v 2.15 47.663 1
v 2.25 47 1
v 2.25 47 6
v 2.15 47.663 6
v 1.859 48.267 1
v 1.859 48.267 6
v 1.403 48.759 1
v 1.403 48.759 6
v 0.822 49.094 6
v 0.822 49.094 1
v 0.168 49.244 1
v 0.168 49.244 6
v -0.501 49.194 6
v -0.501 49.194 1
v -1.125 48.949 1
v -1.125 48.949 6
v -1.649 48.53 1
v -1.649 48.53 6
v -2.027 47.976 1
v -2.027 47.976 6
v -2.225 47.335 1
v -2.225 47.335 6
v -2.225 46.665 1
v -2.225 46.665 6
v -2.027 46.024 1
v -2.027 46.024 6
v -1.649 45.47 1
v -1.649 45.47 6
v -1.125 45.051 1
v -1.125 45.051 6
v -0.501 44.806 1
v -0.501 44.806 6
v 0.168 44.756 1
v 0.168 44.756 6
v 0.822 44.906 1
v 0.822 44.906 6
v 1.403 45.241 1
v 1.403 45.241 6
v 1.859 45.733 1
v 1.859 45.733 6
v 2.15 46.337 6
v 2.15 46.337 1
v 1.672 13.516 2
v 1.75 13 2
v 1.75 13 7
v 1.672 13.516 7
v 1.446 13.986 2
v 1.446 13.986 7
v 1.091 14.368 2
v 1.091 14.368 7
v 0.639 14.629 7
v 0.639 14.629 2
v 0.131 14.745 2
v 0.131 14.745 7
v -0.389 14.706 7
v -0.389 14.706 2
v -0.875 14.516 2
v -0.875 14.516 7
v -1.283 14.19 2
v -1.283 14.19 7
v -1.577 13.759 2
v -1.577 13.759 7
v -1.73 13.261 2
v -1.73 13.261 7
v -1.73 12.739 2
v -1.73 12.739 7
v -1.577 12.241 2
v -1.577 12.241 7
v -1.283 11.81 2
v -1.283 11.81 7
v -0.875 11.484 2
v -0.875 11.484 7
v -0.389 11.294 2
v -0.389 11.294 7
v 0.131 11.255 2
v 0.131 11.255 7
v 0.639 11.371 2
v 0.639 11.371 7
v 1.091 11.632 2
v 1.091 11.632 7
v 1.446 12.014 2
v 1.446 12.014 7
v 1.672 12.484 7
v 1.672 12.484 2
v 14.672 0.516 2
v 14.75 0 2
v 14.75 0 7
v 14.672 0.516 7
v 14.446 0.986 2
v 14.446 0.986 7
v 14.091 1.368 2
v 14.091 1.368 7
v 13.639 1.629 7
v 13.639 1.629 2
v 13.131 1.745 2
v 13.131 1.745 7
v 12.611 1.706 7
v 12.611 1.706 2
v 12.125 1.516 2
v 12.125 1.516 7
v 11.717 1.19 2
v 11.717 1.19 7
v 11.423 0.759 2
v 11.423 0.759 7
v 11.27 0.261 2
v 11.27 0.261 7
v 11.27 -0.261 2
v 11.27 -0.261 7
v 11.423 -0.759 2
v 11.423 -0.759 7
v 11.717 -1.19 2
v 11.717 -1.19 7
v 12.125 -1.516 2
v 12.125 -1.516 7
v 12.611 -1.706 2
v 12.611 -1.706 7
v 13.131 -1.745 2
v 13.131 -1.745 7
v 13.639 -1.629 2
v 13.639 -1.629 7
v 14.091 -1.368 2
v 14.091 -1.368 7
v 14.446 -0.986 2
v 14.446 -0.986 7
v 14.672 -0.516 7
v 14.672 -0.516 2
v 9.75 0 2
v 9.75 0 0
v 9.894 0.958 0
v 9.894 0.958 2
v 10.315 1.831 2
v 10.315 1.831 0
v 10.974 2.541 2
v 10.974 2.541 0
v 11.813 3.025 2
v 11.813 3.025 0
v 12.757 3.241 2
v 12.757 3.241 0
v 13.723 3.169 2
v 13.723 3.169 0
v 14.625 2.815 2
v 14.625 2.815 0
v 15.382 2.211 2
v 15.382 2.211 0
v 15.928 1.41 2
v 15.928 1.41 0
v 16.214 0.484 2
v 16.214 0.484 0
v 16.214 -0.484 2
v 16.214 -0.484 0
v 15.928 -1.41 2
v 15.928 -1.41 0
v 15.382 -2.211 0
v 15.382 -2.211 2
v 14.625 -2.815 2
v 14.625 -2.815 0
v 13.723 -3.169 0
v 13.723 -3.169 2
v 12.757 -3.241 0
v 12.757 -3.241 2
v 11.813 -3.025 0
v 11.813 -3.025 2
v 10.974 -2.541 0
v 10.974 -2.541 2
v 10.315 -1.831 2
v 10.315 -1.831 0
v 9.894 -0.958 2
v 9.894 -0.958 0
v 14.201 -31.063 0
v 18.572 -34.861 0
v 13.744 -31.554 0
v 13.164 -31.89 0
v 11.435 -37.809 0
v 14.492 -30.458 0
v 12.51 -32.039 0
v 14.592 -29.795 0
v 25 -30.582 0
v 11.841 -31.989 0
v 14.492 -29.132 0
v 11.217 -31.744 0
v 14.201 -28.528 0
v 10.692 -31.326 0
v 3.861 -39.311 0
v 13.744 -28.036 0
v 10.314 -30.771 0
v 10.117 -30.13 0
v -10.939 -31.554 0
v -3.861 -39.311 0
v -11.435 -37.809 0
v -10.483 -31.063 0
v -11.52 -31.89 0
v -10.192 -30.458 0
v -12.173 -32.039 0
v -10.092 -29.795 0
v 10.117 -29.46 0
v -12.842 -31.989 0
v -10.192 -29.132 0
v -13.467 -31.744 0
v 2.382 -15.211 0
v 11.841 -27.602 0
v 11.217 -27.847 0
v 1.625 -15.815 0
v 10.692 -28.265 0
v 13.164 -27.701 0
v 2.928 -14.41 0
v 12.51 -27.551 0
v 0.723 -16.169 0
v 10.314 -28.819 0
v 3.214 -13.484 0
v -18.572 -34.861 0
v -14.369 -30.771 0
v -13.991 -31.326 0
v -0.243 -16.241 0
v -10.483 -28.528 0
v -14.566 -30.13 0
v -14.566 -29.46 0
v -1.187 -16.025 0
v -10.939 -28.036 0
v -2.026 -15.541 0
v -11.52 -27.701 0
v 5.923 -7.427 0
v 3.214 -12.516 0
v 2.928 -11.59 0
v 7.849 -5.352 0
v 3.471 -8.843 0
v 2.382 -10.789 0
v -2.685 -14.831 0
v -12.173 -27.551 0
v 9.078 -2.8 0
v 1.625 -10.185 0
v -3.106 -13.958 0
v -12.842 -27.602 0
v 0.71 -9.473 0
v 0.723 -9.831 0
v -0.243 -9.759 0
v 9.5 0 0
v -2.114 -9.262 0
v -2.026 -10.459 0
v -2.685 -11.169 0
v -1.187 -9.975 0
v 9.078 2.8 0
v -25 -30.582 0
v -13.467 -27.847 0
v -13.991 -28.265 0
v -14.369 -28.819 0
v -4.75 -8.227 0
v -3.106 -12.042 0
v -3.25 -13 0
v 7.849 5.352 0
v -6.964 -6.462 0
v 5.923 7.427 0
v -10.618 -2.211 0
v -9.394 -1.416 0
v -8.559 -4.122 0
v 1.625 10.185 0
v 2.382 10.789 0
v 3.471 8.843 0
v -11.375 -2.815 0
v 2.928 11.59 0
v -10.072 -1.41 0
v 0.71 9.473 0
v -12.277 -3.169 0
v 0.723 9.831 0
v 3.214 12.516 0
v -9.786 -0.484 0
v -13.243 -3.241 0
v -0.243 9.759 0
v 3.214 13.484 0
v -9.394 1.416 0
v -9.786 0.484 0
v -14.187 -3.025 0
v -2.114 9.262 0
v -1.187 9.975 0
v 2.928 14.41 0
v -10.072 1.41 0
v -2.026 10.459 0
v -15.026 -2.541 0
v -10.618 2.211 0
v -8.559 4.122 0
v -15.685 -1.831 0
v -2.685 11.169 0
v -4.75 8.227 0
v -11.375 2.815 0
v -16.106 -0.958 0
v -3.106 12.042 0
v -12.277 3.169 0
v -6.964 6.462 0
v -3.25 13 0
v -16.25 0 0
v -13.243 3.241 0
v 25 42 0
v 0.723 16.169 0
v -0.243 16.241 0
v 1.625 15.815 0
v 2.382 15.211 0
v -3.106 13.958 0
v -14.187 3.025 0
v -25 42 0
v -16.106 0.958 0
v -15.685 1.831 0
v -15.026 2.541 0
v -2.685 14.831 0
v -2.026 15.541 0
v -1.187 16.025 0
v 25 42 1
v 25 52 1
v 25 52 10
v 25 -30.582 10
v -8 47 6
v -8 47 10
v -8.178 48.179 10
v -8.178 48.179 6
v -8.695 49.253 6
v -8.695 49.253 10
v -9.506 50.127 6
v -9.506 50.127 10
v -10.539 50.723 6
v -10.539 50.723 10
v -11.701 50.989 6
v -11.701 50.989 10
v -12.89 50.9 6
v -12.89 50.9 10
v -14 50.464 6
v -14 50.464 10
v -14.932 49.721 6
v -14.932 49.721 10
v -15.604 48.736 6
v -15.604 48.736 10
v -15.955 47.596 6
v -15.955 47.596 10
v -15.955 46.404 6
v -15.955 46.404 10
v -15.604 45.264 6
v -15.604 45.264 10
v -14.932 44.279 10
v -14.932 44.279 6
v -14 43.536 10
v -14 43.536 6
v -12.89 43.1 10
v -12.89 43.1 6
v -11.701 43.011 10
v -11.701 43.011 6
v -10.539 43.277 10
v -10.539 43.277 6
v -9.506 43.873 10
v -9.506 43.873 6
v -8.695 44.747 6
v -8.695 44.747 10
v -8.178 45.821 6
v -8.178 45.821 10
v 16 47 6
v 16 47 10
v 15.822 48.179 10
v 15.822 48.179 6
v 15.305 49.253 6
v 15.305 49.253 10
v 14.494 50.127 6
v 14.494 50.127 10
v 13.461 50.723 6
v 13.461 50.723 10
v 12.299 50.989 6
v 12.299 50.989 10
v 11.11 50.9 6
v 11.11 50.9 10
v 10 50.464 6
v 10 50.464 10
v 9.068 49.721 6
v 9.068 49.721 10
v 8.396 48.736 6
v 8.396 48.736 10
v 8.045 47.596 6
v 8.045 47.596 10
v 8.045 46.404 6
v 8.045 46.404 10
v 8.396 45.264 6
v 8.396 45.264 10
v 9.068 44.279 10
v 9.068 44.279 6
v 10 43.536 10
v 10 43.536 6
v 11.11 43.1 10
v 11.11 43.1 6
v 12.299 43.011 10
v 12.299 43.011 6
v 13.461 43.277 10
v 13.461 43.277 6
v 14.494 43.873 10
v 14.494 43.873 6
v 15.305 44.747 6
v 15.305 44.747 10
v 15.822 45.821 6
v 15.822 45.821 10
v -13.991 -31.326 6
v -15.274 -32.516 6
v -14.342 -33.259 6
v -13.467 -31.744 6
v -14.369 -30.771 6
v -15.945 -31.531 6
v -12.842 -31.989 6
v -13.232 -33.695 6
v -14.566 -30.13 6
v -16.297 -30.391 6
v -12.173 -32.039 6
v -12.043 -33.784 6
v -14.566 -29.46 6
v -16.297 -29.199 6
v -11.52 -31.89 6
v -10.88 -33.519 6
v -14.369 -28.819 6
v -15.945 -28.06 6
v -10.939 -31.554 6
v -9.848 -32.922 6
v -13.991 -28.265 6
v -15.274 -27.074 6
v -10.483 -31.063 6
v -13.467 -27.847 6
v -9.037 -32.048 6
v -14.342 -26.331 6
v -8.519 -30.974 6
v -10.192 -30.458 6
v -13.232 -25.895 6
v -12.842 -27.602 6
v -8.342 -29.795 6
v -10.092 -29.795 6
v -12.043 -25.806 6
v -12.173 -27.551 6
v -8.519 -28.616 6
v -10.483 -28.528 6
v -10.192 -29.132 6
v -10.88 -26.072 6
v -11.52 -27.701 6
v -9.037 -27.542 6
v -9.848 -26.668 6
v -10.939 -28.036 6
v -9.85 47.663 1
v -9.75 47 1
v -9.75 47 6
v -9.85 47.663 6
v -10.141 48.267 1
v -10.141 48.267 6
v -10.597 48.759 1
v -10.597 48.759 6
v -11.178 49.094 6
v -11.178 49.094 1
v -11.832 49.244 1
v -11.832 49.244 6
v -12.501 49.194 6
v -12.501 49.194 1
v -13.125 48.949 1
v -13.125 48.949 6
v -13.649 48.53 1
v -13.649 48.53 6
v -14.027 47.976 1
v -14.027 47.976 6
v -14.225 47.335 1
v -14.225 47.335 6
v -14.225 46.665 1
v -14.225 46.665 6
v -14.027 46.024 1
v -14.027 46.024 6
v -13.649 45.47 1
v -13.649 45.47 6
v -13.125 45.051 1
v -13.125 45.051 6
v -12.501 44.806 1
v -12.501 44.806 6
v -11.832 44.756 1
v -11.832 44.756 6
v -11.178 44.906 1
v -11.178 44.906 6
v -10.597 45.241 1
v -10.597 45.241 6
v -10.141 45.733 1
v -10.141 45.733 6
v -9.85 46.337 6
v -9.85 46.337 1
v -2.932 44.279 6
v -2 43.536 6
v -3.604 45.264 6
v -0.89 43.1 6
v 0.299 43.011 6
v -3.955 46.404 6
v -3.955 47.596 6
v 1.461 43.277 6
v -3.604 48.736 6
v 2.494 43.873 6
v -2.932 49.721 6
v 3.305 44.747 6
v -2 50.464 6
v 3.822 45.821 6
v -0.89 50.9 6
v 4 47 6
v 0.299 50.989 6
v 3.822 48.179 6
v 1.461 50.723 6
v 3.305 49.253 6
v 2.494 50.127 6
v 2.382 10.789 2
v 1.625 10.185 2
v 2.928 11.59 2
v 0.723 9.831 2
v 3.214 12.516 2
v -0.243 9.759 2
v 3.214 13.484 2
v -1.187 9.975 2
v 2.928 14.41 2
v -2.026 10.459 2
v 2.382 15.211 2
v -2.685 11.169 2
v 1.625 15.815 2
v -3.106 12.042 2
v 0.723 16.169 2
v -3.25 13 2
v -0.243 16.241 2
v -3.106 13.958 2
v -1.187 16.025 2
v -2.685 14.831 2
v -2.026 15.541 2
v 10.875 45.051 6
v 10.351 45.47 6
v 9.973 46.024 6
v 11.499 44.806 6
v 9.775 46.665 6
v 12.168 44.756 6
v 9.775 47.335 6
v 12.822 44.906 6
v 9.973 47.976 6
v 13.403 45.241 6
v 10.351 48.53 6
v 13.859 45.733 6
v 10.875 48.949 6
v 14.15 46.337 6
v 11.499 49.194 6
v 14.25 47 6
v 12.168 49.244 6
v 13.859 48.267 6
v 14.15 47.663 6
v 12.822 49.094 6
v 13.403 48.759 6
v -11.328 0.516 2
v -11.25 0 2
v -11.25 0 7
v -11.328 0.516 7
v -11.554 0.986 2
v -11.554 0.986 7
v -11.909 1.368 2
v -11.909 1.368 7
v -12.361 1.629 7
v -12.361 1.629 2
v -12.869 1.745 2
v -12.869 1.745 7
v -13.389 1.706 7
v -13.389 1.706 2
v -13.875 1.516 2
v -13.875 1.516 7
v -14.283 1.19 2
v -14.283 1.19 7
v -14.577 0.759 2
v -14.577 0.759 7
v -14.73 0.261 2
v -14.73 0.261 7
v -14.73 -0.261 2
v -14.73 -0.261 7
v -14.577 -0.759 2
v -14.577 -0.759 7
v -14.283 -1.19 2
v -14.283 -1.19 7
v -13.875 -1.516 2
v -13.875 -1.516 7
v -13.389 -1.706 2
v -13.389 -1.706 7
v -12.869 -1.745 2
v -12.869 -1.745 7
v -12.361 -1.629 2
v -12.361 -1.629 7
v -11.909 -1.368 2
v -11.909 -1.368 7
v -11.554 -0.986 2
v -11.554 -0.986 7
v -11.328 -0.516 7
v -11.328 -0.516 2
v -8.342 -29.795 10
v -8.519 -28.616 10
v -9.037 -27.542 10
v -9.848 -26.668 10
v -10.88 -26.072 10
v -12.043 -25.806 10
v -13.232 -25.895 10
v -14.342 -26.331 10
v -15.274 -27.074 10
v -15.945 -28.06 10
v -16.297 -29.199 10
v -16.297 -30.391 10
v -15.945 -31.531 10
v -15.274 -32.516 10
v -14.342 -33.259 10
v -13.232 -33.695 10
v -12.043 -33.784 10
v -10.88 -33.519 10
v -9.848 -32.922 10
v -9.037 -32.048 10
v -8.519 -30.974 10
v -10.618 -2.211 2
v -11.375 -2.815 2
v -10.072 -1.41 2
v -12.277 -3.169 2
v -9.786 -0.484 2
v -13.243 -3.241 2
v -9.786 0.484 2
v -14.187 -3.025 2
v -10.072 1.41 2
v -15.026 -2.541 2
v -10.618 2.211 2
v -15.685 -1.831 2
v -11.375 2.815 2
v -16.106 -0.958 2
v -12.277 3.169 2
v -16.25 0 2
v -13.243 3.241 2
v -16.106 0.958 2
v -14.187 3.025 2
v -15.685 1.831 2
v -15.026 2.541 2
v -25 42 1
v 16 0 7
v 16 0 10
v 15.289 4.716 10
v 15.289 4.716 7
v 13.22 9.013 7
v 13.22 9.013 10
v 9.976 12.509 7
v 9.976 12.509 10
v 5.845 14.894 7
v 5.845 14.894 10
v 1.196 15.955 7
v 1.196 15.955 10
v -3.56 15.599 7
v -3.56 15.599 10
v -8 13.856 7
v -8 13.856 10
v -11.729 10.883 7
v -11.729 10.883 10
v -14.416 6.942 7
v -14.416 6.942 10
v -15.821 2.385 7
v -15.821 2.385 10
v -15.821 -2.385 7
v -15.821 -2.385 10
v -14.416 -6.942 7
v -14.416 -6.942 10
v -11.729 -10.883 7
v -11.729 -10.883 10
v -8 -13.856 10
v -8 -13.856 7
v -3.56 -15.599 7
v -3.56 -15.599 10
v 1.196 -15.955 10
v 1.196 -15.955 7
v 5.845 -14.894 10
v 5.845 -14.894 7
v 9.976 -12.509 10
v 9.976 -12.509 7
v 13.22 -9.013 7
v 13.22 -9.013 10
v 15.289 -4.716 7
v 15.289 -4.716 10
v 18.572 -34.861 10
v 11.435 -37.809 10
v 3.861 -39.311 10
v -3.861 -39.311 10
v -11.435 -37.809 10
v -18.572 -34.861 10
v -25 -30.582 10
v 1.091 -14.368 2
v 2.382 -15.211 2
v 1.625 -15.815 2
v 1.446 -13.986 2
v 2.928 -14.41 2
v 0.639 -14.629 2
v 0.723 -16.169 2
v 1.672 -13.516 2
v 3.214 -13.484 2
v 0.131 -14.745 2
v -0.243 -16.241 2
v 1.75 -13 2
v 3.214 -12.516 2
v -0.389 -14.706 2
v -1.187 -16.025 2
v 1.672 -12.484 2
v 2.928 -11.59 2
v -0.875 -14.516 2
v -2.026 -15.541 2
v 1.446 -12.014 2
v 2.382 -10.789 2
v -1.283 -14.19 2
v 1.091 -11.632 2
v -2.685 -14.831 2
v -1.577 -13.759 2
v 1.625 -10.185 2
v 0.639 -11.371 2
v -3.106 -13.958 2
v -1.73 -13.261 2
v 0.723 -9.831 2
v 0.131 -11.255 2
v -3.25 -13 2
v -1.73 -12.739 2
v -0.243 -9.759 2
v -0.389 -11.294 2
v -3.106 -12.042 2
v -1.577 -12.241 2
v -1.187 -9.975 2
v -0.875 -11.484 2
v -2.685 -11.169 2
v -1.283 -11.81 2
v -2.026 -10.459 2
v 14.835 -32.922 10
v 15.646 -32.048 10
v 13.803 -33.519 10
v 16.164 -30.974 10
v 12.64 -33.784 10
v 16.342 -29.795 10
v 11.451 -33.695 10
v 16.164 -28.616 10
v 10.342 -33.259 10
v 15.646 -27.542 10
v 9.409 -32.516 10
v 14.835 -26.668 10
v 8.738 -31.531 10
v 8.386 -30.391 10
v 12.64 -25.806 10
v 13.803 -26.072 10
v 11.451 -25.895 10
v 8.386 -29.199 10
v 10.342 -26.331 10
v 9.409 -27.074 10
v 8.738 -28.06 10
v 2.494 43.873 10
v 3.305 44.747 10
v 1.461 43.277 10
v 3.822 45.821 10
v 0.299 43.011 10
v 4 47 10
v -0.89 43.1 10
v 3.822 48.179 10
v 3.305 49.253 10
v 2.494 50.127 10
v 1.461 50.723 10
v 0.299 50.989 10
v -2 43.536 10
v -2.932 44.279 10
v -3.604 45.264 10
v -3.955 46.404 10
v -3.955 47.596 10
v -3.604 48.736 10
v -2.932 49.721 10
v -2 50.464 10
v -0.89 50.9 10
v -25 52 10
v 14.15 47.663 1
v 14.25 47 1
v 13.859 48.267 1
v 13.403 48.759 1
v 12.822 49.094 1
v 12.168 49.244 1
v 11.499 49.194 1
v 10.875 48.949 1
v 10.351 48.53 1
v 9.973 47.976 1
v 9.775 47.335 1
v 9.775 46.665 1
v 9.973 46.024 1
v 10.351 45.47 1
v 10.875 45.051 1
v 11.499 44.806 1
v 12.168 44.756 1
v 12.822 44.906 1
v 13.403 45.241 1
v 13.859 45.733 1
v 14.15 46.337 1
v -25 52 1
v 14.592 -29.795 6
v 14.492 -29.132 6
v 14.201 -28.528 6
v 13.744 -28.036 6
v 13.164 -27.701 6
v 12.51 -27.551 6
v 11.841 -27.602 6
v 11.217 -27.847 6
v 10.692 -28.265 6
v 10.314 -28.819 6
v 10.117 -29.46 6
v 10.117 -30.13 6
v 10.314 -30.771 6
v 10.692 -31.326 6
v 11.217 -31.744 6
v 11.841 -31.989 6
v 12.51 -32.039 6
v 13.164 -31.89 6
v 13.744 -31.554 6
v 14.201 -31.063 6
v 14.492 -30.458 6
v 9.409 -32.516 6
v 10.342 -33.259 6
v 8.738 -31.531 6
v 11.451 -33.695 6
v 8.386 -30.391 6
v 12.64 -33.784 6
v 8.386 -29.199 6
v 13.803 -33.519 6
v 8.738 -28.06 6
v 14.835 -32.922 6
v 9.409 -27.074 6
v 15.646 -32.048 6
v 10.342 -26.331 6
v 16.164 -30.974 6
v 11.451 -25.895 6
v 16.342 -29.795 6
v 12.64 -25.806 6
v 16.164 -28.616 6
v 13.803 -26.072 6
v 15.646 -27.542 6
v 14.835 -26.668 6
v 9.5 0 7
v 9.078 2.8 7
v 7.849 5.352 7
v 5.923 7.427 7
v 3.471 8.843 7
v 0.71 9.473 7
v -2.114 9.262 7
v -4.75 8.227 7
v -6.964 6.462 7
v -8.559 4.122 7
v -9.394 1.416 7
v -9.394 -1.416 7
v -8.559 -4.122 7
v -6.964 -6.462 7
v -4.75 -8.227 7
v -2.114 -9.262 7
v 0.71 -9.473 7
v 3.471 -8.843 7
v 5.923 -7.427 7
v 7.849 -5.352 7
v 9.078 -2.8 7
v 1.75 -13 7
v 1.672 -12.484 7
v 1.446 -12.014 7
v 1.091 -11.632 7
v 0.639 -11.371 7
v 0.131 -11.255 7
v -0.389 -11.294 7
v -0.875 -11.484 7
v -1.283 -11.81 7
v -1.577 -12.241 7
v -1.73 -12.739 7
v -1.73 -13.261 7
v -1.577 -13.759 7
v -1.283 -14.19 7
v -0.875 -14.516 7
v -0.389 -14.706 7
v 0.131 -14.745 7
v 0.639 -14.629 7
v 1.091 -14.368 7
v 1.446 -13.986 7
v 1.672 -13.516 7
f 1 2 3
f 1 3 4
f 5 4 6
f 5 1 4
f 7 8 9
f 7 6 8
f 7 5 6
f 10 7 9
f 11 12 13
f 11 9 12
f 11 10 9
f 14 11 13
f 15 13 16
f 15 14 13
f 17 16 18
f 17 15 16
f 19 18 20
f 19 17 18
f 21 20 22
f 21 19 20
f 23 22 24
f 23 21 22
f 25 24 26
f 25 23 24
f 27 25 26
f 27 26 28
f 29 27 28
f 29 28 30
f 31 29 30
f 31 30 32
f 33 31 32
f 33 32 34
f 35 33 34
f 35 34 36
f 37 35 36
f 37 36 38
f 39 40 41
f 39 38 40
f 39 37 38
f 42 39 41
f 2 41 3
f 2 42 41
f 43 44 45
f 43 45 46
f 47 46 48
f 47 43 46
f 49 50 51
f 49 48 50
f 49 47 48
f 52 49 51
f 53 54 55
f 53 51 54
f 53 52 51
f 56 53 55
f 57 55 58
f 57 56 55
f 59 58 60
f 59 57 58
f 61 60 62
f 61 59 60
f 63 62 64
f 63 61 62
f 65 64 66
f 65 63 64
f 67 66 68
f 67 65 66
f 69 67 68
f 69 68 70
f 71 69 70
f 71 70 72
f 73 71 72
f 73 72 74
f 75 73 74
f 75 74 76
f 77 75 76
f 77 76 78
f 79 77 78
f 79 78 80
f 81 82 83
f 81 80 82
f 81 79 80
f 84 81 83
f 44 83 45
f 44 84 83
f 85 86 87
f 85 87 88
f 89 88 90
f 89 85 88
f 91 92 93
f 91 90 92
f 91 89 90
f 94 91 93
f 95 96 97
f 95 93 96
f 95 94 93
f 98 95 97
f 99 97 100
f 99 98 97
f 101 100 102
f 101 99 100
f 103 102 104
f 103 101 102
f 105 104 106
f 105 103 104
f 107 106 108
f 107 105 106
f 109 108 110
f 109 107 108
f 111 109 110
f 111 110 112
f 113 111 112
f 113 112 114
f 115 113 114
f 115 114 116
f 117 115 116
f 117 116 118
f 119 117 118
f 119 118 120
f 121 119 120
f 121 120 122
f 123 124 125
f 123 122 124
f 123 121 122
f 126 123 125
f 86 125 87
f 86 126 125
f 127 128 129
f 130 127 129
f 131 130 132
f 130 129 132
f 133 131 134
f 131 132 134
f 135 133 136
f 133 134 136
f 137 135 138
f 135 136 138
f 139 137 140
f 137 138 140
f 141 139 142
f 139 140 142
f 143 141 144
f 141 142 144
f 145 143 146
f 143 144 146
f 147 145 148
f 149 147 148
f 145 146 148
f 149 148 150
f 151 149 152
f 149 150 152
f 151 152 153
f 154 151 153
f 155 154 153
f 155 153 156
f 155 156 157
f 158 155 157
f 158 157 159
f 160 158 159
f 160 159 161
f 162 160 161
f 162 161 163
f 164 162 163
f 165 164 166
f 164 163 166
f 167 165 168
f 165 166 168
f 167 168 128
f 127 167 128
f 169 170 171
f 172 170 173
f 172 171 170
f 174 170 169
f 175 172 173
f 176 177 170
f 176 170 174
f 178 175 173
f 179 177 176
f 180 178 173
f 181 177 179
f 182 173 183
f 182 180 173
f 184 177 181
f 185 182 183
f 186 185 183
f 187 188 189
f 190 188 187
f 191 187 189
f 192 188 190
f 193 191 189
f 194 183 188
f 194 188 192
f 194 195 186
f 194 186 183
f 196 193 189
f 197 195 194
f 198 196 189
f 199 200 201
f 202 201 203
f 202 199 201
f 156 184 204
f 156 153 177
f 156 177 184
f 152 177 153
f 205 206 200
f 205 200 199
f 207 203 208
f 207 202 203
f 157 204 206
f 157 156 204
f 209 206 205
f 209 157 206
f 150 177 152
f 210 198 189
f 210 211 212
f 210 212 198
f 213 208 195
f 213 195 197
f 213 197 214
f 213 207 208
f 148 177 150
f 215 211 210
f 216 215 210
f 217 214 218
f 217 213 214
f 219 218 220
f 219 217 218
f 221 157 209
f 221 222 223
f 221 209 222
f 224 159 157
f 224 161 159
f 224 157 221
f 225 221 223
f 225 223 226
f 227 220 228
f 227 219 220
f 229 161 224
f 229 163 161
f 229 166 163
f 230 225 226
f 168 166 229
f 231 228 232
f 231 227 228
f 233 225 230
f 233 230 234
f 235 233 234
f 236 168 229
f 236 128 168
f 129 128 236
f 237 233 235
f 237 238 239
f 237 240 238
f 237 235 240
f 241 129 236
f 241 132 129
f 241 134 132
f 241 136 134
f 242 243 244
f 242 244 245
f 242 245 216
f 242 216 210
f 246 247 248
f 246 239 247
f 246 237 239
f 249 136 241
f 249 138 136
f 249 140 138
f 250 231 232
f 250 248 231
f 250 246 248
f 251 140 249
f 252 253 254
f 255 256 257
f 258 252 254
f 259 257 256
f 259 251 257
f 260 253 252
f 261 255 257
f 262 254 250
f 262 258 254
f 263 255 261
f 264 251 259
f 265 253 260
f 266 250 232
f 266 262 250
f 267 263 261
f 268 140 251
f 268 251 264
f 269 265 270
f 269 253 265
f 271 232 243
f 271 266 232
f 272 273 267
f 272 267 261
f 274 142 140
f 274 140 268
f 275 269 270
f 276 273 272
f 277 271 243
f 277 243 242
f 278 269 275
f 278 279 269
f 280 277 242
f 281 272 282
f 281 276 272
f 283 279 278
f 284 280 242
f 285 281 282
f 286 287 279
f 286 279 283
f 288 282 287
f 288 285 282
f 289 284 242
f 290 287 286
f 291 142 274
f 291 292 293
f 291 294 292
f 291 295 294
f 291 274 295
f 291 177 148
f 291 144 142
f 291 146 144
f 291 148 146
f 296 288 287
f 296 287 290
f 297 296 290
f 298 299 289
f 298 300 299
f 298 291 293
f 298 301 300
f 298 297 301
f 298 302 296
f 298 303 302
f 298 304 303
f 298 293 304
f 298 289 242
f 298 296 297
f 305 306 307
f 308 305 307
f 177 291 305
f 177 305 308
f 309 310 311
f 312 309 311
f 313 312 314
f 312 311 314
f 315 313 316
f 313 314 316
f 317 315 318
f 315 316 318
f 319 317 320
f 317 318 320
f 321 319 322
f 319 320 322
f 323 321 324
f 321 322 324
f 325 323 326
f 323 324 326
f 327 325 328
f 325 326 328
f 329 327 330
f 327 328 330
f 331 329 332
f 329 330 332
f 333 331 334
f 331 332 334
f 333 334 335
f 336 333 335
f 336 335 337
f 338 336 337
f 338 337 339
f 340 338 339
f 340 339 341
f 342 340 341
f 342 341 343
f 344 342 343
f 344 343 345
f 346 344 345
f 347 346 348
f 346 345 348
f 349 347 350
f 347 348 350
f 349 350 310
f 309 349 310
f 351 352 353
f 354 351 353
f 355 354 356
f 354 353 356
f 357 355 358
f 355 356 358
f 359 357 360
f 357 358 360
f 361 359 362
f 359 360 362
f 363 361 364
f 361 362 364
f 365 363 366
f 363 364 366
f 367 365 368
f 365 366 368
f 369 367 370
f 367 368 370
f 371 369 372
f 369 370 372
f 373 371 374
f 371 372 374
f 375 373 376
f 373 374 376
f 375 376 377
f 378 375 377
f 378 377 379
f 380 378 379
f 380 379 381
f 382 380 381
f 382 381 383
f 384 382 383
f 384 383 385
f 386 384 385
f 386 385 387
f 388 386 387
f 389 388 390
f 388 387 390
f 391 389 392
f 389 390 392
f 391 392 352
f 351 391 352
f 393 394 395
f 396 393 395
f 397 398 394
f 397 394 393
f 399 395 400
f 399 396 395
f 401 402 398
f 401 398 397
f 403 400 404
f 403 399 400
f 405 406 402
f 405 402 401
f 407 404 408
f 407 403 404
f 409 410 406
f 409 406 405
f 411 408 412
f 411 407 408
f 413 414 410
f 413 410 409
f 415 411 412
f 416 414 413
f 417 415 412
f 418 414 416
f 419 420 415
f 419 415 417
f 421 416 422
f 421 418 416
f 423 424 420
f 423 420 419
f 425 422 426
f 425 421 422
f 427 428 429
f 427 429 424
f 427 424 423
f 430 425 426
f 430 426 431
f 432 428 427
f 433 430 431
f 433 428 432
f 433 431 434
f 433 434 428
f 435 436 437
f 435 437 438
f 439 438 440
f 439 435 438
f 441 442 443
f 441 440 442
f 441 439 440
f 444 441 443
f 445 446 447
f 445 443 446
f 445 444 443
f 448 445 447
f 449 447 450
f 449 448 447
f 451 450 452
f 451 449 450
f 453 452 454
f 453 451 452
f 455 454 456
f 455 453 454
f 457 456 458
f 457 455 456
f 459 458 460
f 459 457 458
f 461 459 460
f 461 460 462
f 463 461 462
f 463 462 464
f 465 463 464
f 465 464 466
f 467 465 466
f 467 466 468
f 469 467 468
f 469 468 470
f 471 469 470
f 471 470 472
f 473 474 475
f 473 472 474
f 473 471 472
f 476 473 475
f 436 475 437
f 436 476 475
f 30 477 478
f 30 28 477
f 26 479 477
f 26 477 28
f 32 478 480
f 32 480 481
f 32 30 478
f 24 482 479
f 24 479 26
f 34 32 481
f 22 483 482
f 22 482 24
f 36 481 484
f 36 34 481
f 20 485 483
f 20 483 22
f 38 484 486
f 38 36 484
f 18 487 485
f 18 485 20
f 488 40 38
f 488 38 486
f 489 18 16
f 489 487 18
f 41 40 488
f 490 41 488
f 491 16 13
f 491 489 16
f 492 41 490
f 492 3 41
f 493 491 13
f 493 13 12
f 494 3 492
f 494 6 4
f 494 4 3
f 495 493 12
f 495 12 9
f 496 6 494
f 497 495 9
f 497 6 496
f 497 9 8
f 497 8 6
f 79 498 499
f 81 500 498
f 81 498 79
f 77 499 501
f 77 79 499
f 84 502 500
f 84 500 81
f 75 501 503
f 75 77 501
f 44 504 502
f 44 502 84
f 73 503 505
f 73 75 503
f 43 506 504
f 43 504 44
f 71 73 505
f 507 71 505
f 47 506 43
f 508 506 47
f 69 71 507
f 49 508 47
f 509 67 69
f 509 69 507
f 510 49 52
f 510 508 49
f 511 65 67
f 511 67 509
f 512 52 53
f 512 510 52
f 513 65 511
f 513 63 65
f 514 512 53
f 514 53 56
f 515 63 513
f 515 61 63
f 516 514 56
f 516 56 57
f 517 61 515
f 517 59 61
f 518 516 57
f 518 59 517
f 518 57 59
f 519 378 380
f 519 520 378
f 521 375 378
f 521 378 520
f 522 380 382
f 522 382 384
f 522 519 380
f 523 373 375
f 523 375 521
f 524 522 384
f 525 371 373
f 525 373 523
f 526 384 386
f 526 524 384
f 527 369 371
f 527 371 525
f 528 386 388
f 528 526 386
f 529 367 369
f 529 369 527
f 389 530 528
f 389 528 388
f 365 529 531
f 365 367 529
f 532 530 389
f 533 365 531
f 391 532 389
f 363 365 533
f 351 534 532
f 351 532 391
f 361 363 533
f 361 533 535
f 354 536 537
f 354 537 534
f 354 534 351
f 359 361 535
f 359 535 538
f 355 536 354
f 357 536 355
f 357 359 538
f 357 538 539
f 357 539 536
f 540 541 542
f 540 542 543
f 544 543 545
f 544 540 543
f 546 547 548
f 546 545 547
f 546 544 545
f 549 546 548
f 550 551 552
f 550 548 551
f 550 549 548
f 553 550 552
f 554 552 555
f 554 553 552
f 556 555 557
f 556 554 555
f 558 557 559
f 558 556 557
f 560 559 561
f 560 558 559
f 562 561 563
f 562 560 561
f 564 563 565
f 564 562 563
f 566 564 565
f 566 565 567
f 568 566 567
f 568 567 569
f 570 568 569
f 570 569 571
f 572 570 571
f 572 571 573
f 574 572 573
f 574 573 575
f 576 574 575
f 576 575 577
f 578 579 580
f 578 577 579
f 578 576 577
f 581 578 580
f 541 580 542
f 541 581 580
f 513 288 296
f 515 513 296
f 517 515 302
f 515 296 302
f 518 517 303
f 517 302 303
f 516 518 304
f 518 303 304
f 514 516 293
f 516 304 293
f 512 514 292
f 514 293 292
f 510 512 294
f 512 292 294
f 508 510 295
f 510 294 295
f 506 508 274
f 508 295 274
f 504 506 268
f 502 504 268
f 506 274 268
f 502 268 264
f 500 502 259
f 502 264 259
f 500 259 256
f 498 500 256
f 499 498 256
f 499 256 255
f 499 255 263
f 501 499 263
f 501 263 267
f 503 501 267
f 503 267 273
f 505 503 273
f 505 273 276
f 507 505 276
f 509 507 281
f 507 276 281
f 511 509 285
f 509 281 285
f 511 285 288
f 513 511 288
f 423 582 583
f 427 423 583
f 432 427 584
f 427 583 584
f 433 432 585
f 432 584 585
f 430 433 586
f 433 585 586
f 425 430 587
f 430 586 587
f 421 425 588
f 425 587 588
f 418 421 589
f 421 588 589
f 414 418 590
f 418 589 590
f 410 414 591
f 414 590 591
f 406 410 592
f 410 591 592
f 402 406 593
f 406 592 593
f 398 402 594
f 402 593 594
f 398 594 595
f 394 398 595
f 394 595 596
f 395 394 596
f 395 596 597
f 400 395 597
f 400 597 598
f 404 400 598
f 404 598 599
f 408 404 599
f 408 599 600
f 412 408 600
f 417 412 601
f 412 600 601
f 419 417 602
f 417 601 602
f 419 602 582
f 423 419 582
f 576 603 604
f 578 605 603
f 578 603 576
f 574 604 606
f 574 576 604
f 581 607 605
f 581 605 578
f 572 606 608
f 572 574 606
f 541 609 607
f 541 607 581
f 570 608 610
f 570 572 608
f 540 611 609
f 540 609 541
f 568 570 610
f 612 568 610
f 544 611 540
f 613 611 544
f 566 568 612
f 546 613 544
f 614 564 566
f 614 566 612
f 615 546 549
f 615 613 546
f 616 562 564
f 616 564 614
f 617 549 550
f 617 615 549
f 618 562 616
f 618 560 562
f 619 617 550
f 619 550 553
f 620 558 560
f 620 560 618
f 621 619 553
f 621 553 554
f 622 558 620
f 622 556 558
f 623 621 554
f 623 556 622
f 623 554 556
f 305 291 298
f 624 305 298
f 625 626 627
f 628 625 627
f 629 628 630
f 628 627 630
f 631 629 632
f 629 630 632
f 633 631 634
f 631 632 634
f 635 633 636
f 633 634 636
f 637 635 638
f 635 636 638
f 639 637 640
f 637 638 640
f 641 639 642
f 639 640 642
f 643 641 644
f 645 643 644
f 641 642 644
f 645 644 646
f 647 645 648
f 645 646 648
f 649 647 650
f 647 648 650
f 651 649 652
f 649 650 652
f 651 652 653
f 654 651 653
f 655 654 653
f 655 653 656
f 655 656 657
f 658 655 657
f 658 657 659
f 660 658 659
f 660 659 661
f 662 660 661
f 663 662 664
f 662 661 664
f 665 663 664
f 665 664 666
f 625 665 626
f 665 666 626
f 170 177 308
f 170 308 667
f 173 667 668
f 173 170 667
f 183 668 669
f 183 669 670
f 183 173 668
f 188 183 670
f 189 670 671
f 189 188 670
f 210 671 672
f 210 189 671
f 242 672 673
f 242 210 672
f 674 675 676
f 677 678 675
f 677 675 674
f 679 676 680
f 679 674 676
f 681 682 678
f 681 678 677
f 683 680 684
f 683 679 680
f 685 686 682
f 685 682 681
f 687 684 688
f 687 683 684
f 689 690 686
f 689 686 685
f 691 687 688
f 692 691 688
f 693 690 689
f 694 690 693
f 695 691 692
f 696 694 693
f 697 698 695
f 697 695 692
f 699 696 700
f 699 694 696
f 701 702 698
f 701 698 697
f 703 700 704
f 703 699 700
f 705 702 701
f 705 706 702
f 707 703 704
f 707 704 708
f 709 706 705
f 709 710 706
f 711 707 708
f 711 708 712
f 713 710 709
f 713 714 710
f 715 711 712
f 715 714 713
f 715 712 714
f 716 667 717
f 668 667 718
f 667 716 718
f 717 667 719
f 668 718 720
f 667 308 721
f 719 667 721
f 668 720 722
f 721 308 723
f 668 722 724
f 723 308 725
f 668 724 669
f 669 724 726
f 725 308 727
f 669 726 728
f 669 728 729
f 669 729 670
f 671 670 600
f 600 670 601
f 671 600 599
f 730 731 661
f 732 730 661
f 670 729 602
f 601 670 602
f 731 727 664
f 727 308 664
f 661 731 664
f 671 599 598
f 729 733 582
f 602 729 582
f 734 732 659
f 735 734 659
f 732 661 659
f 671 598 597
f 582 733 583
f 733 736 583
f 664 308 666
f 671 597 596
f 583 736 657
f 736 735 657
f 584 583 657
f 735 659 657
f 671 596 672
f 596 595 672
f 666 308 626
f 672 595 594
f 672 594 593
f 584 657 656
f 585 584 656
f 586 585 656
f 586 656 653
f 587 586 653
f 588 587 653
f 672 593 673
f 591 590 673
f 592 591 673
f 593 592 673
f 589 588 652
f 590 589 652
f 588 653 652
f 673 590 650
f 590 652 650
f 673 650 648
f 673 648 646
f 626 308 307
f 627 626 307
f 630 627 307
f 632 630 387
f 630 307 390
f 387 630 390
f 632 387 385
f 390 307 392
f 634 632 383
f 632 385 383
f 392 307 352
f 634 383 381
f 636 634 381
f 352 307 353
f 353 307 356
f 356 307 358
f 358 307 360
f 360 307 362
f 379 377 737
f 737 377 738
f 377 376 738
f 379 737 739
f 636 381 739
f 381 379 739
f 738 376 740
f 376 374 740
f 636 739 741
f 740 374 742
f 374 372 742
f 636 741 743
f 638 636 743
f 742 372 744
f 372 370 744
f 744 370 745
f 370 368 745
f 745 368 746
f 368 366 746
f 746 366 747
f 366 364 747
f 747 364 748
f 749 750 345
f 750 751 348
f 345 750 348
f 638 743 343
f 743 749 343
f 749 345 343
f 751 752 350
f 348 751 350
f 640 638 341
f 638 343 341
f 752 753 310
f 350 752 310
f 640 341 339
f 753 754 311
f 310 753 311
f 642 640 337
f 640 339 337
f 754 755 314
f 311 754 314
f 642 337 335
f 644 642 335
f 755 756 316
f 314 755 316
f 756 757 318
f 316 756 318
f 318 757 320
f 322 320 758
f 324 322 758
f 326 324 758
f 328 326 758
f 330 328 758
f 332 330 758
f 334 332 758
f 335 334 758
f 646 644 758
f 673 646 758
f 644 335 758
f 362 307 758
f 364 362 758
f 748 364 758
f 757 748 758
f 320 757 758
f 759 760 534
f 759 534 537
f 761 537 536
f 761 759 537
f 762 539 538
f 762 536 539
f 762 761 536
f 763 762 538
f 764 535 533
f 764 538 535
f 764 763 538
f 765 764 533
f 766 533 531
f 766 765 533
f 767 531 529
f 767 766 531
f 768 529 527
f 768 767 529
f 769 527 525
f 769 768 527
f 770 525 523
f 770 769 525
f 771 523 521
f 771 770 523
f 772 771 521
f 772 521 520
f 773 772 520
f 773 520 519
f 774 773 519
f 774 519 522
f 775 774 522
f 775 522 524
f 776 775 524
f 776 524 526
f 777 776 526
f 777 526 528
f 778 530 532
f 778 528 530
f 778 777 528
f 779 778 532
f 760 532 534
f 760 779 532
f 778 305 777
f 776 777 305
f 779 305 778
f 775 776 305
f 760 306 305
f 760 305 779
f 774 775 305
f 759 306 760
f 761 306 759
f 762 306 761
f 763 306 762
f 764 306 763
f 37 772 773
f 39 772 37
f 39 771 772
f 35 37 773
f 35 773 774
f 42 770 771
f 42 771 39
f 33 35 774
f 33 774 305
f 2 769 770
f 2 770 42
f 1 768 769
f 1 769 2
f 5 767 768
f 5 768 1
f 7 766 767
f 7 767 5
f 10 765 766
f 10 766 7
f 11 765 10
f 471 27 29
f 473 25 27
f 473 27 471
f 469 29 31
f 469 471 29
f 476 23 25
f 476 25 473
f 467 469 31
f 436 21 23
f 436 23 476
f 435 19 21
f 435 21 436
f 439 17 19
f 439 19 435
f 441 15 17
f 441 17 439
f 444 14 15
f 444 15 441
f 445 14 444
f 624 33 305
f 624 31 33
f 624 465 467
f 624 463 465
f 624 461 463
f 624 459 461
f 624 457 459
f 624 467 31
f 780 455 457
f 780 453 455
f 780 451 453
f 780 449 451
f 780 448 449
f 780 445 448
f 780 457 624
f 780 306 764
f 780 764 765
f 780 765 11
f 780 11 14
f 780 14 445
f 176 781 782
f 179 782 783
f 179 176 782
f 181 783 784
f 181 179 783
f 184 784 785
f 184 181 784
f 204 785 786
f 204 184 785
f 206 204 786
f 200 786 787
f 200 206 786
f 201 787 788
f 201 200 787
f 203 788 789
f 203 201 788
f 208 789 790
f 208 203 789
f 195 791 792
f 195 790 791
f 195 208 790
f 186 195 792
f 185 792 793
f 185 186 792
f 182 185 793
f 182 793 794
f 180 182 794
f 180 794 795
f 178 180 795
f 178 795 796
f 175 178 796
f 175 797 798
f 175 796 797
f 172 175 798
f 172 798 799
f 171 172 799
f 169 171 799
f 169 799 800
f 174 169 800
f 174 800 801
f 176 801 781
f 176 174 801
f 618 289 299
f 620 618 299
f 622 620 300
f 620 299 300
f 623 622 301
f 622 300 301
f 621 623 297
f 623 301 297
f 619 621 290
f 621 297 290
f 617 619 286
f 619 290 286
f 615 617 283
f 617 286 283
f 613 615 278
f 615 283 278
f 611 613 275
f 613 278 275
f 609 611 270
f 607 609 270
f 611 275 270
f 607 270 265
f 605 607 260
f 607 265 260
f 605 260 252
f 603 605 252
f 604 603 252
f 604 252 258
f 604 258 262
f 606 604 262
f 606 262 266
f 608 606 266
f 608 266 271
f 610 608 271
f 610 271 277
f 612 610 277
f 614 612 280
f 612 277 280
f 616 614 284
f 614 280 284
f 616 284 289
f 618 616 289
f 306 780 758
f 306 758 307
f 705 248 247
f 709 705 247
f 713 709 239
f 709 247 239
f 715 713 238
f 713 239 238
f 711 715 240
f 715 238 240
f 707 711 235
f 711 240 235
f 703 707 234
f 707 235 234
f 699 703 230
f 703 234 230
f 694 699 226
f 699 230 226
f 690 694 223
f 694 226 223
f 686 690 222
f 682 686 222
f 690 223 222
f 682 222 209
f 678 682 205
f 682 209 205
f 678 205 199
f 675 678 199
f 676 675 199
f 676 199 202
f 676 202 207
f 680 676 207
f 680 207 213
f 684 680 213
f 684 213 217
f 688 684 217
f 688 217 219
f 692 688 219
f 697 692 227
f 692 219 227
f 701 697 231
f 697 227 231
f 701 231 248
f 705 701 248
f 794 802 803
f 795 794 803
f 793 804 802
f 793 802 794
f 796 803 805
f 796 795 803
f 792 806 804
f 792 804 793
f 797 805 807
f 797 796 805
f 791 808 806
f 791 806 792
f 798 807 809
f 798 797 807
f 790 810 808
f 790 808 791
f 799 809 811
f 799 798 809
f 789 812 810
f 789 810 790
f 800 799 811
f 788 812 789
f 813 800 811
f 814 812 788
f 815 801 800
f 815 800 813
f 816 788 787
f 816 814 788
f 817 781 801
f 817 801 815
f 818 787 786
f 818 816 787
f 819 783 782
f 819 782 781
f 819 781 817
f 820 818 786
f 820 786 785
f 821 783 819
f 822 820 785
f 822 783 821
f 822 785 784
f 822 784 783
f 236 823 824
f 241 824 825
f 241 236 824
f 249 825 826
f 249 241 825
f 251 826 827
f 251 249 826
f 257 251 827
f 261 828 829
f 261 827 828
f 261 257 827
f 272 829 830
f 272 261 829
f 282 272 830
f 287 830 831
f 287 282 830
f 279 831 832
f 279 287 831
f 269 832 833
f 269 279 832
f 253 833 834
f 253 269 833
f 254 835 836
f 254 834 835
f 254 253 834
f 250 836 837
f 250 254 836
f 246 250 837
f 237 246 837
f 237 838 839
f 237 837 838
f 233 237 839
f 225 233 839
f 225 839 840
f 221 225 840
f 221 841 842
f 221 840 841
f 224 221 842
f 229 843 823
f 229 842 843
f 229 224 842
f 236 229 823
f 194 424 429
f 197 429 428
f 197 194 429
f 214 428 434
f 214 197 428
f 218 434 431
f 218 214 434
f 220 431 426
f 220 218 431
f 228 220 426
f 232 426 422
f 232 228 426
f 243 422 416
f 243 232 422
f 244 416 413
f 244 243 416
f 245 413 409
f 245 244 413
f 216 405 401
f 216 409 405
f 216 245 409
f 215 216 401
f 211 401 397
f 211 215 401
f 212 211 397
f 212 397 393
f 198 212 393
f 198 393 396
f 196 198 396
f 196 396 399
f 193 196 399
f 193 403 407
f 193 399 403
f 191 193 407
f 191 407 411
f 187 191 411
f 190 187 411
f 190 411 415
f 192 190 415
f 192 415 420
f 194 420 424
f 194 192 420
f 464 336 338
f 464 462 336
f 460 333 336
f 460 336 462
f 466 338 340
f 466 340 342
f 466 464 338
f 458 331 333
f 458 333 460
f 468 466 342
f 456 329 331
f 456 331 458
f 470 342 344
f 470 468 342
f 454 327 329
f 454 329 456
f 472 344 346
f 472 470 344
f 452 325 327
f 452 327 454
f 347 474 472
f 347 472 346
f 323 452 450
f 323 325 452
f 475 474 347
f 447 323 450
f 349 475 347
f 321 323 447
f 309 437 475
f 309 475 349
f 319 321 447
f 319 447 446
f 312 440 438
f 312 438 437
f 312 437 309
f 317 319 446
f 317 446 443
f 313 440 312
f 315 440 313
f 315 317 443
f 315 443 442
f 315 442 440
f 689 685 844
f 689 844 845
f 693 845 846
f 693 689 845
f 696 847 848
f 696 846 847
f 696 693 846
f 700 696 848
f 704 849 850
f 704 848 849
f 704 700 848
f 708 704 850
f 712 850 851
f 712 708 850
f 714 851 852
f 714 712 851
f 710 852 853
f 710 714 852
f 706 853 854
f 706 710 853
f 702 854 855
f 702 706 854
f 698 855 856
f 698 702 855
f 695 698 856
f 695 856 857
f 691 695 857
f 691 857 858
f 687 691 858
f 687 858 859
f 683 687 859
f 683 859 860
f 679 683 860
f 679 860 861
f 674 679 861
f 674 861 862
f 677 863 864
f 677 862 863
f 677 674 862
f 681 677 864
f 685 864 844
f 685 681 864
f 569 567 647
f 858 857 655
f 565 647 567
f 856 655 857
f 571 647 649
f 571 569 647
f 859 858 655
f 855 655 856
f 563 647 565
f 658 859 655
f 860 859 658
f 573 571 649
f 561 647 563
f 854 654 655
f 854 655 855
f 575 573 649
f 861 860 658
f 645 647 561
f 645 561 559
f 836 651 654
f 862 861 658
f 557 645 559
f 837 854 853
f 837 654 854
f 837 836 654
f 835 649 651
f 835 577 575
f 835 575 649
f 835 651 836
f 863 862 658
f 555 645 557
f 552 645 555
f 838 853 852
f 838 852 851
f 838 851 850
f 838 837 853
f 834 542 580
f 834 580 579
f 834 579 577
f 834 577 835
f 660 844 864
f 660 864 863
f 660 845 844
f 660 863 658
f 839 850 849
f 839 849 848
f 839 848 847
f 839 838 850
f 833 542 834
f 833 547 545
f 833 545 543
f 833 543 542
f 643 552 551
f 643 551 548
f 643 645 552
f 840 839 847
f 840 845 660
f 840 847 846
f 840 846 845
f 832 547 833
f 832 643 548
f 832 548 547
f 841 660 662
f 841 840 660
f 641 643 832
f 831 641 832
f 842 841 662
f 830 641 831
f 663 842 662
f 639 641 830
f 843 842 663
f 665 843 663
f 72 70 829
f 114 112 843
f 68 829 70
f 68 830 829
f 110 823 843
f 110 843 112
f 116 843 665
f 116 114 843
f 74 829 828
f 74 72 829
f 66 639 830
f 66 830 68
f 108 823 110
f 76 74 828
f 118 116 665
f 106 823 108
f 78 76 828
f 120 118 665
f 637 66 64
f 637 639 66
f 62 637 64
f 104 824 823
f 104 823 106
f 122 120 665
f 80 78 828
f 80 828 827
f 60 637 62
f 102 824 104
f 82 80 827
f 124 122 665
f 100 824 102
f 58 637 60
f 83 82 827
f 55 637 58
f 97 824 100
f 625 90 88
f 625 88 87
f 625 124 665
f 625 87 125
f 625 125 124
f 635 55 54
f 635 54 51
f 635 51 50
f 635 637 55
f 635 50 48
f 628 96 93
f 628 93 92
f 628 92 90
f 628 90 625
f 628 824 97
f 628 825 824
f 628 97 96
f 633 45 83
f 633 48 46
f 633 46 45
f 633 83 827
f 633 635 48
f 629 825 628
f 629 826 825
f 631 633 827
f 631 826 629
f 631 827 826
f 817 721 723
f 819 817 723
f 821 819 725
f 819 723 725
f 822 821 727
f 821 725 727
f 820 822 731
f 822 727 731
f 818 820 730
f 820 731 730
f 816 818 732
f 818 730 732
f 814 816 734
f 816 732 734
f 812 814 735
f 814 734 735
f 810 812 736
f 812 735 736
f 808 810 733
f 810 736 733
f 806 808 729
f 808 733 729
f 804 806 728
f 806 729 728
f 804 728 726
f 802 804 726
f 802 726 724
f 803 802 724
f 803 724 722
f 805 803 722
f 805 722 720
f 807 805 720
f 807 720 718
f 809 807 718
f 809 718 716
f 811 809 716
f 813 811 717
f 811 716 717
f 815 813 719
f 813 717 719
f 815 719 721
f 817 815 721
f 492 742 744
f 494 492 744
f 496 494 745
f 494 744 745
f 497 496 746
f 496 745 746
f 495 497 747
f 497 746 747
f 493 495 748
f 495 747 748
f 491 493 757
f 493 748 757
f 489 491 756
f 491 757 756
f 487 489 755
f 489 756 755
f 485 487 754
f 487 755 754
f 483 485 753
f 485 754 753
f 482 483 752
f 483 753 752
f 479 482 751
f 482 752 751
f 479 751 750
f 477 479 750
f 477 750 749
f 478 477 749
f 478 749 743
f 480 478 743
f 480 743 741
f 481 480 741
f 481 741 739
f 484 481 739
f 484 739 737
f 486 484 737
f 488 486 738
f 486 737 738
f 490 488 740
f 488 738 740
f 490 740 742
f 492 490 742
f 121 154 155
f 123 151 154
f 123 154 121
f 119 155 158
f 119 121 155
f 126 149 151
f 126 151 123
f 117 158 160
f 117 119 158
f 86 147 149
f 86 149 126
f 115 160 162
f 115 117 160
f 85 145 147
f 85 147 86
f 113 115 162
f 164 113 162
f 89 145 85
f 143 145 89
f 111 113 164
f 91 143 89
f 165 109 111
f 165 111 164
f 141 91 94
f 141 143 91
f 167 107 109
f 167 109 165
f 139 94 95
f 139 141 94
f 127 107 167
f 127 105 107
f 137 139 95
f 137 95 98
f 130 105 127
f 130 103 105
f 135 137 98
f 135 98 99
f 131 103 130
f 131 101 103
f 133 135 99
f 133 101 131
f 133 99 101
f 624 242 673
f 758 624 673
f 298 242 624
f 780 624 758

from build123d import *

# Parameters (mm, degrees)
SKETCH_1_R          = 2.25
SKETCH_1_R_2        = 9.5
SKETCH_1_R_3        = 1.75
EXTRUDE_1_DEPTH     = 10
SKETCH_3_R          = 16
CUT_EXTRUDE_1_DEPTH = 3
SKETCH_4_R          = 4
CUT_EXTRUDE_2_DEPTH = 4
SKETCH_5_W          = 50
SKETCH_5_H          = 10
CUT_EXTRUDE_3_DEPTH = 1
SKETCH_6_R          = 3.25
CUT_EXTRUDE_4_DEPTH = 2


with BuildPart() as part:
    # 스케치1 → 보스-돌출1 (new body)
    with BuildSketch(Plane.XY):
        with BuildLine():
            Line((-25, 0), (-25, 52))
            Line((-25, 52), (25, 52))
            Line((25, 52), (25, -30.581857367))
            ThreePointArc((25, -30.581857367), (0, -39.5), (-25, -30.581857367))
            Line((-25, -30.581857367), (-25, 0))
        make_face()
        with Locations((-12.341540694, -29.795114923)):
            Circle(SKETCH_1_R, mode=Mode.SUBTRACT)
        with Locations((12.341540694, -29.795114923)):
            Circle(SKETCH_1_R, mode=Mode.SUBTRACT)
        with Locations((0, 47)):
            Circle(SKETCH_1_R, mode=Mode.SUBTRACT)
        with Locations((12, 47)):
            Circle(SKETCH_1_R, mode=Mode.SUBTRACT)
        with Locations((-12, 47)):
            Circle(SKETCH_1_R, mode=Mode.SUBTRACT)
        Circle(SKETCH_1_R_2, mode=Mode.SUBTRACT)
        with Locations((-13, 0)):
            Circle(SKETCH_1_R_3, mode=Mode.SUBTRACT)
        with Locations((0, 13)):
            Circle(SKETCH_1_R_3, mode=Mode.SUBTRACT)
        with Locations((13, 0)):
            Circle(SKETCH_1_R_3, mode=Mode.SUBTRACT)
        with Locations((0, -13)):
            Circle(SKETCH_1_R_3, mode=Mode.SUBTRACT)
    extrude(amount=EXTRUDE_1_DEPTH)

    # 스케치3 → 컷-돌출1 (cut)
    with BuildSketch(Plane.XY.offset(10)):
        Circle(SKETCH_3_R)
    extrude(amount=-CUT_EXTRUDE_1_DEPTH, mode=Mode.SUBTRACT)

    # 스케치4 → 컷-돌출2 (cut)
    with BuildSketch(Plane.XY.offset(10)):
        with Locations((-12, 47)):
            Circle(SKETCH_4_R)
        with Locations((0, 47)):
            Circle(SKETCH_4_R)
        with Locations((12, 47)):
            Circle(SKETCH_4_R)
        with Locations((12.341540694, -29.795114923)):
            Circle(SKETCH_4_R)
        with Locations((-12.341540694, -29.795114923)):
            Circle(SKETCH_4_R)
    extrude(amount=-CUT_EXTRUDE_2_DEPTH, mode=Mode.SUBTRACT)

    # 스케치5 → 컷-돌출3 (cut)
    with BuildSketch(Plane(origin=(0, 0, 0), x_dir=(-1, 0, 0), z_dir=(0, 0, -1))):
        with Locations((0, 47)):
            Rectangle(SKETCH_5_W, SKETCH_5_H)
    extrude(amount=-CUT_EXTRUDE_3_DEPTH, mode=Mode.SUBTRACT)

    # 스케치6 → 컷-돌출4 (cut)
    with BuildSketch(Plane(origin=(0, 0, 0), x_dir=(-1, 0, 0), z_dir=(0, 0, -1))):
        with Locations((0, 13)):
            Circle(SKETCH_6_R)
        with Locations((13, 0)):
            Circle(SKETCH_6_R)
        with Locations((0, -13)):
            Circle(SKETCH_6_R)
        with Locations((-13, 0)):
            Circle(SKETCH_6_R)
    extrude(amount=-CUT_EXTRUDE_4_DEPTH, mode=Mode.SUBTRACT)


solid = part.part
